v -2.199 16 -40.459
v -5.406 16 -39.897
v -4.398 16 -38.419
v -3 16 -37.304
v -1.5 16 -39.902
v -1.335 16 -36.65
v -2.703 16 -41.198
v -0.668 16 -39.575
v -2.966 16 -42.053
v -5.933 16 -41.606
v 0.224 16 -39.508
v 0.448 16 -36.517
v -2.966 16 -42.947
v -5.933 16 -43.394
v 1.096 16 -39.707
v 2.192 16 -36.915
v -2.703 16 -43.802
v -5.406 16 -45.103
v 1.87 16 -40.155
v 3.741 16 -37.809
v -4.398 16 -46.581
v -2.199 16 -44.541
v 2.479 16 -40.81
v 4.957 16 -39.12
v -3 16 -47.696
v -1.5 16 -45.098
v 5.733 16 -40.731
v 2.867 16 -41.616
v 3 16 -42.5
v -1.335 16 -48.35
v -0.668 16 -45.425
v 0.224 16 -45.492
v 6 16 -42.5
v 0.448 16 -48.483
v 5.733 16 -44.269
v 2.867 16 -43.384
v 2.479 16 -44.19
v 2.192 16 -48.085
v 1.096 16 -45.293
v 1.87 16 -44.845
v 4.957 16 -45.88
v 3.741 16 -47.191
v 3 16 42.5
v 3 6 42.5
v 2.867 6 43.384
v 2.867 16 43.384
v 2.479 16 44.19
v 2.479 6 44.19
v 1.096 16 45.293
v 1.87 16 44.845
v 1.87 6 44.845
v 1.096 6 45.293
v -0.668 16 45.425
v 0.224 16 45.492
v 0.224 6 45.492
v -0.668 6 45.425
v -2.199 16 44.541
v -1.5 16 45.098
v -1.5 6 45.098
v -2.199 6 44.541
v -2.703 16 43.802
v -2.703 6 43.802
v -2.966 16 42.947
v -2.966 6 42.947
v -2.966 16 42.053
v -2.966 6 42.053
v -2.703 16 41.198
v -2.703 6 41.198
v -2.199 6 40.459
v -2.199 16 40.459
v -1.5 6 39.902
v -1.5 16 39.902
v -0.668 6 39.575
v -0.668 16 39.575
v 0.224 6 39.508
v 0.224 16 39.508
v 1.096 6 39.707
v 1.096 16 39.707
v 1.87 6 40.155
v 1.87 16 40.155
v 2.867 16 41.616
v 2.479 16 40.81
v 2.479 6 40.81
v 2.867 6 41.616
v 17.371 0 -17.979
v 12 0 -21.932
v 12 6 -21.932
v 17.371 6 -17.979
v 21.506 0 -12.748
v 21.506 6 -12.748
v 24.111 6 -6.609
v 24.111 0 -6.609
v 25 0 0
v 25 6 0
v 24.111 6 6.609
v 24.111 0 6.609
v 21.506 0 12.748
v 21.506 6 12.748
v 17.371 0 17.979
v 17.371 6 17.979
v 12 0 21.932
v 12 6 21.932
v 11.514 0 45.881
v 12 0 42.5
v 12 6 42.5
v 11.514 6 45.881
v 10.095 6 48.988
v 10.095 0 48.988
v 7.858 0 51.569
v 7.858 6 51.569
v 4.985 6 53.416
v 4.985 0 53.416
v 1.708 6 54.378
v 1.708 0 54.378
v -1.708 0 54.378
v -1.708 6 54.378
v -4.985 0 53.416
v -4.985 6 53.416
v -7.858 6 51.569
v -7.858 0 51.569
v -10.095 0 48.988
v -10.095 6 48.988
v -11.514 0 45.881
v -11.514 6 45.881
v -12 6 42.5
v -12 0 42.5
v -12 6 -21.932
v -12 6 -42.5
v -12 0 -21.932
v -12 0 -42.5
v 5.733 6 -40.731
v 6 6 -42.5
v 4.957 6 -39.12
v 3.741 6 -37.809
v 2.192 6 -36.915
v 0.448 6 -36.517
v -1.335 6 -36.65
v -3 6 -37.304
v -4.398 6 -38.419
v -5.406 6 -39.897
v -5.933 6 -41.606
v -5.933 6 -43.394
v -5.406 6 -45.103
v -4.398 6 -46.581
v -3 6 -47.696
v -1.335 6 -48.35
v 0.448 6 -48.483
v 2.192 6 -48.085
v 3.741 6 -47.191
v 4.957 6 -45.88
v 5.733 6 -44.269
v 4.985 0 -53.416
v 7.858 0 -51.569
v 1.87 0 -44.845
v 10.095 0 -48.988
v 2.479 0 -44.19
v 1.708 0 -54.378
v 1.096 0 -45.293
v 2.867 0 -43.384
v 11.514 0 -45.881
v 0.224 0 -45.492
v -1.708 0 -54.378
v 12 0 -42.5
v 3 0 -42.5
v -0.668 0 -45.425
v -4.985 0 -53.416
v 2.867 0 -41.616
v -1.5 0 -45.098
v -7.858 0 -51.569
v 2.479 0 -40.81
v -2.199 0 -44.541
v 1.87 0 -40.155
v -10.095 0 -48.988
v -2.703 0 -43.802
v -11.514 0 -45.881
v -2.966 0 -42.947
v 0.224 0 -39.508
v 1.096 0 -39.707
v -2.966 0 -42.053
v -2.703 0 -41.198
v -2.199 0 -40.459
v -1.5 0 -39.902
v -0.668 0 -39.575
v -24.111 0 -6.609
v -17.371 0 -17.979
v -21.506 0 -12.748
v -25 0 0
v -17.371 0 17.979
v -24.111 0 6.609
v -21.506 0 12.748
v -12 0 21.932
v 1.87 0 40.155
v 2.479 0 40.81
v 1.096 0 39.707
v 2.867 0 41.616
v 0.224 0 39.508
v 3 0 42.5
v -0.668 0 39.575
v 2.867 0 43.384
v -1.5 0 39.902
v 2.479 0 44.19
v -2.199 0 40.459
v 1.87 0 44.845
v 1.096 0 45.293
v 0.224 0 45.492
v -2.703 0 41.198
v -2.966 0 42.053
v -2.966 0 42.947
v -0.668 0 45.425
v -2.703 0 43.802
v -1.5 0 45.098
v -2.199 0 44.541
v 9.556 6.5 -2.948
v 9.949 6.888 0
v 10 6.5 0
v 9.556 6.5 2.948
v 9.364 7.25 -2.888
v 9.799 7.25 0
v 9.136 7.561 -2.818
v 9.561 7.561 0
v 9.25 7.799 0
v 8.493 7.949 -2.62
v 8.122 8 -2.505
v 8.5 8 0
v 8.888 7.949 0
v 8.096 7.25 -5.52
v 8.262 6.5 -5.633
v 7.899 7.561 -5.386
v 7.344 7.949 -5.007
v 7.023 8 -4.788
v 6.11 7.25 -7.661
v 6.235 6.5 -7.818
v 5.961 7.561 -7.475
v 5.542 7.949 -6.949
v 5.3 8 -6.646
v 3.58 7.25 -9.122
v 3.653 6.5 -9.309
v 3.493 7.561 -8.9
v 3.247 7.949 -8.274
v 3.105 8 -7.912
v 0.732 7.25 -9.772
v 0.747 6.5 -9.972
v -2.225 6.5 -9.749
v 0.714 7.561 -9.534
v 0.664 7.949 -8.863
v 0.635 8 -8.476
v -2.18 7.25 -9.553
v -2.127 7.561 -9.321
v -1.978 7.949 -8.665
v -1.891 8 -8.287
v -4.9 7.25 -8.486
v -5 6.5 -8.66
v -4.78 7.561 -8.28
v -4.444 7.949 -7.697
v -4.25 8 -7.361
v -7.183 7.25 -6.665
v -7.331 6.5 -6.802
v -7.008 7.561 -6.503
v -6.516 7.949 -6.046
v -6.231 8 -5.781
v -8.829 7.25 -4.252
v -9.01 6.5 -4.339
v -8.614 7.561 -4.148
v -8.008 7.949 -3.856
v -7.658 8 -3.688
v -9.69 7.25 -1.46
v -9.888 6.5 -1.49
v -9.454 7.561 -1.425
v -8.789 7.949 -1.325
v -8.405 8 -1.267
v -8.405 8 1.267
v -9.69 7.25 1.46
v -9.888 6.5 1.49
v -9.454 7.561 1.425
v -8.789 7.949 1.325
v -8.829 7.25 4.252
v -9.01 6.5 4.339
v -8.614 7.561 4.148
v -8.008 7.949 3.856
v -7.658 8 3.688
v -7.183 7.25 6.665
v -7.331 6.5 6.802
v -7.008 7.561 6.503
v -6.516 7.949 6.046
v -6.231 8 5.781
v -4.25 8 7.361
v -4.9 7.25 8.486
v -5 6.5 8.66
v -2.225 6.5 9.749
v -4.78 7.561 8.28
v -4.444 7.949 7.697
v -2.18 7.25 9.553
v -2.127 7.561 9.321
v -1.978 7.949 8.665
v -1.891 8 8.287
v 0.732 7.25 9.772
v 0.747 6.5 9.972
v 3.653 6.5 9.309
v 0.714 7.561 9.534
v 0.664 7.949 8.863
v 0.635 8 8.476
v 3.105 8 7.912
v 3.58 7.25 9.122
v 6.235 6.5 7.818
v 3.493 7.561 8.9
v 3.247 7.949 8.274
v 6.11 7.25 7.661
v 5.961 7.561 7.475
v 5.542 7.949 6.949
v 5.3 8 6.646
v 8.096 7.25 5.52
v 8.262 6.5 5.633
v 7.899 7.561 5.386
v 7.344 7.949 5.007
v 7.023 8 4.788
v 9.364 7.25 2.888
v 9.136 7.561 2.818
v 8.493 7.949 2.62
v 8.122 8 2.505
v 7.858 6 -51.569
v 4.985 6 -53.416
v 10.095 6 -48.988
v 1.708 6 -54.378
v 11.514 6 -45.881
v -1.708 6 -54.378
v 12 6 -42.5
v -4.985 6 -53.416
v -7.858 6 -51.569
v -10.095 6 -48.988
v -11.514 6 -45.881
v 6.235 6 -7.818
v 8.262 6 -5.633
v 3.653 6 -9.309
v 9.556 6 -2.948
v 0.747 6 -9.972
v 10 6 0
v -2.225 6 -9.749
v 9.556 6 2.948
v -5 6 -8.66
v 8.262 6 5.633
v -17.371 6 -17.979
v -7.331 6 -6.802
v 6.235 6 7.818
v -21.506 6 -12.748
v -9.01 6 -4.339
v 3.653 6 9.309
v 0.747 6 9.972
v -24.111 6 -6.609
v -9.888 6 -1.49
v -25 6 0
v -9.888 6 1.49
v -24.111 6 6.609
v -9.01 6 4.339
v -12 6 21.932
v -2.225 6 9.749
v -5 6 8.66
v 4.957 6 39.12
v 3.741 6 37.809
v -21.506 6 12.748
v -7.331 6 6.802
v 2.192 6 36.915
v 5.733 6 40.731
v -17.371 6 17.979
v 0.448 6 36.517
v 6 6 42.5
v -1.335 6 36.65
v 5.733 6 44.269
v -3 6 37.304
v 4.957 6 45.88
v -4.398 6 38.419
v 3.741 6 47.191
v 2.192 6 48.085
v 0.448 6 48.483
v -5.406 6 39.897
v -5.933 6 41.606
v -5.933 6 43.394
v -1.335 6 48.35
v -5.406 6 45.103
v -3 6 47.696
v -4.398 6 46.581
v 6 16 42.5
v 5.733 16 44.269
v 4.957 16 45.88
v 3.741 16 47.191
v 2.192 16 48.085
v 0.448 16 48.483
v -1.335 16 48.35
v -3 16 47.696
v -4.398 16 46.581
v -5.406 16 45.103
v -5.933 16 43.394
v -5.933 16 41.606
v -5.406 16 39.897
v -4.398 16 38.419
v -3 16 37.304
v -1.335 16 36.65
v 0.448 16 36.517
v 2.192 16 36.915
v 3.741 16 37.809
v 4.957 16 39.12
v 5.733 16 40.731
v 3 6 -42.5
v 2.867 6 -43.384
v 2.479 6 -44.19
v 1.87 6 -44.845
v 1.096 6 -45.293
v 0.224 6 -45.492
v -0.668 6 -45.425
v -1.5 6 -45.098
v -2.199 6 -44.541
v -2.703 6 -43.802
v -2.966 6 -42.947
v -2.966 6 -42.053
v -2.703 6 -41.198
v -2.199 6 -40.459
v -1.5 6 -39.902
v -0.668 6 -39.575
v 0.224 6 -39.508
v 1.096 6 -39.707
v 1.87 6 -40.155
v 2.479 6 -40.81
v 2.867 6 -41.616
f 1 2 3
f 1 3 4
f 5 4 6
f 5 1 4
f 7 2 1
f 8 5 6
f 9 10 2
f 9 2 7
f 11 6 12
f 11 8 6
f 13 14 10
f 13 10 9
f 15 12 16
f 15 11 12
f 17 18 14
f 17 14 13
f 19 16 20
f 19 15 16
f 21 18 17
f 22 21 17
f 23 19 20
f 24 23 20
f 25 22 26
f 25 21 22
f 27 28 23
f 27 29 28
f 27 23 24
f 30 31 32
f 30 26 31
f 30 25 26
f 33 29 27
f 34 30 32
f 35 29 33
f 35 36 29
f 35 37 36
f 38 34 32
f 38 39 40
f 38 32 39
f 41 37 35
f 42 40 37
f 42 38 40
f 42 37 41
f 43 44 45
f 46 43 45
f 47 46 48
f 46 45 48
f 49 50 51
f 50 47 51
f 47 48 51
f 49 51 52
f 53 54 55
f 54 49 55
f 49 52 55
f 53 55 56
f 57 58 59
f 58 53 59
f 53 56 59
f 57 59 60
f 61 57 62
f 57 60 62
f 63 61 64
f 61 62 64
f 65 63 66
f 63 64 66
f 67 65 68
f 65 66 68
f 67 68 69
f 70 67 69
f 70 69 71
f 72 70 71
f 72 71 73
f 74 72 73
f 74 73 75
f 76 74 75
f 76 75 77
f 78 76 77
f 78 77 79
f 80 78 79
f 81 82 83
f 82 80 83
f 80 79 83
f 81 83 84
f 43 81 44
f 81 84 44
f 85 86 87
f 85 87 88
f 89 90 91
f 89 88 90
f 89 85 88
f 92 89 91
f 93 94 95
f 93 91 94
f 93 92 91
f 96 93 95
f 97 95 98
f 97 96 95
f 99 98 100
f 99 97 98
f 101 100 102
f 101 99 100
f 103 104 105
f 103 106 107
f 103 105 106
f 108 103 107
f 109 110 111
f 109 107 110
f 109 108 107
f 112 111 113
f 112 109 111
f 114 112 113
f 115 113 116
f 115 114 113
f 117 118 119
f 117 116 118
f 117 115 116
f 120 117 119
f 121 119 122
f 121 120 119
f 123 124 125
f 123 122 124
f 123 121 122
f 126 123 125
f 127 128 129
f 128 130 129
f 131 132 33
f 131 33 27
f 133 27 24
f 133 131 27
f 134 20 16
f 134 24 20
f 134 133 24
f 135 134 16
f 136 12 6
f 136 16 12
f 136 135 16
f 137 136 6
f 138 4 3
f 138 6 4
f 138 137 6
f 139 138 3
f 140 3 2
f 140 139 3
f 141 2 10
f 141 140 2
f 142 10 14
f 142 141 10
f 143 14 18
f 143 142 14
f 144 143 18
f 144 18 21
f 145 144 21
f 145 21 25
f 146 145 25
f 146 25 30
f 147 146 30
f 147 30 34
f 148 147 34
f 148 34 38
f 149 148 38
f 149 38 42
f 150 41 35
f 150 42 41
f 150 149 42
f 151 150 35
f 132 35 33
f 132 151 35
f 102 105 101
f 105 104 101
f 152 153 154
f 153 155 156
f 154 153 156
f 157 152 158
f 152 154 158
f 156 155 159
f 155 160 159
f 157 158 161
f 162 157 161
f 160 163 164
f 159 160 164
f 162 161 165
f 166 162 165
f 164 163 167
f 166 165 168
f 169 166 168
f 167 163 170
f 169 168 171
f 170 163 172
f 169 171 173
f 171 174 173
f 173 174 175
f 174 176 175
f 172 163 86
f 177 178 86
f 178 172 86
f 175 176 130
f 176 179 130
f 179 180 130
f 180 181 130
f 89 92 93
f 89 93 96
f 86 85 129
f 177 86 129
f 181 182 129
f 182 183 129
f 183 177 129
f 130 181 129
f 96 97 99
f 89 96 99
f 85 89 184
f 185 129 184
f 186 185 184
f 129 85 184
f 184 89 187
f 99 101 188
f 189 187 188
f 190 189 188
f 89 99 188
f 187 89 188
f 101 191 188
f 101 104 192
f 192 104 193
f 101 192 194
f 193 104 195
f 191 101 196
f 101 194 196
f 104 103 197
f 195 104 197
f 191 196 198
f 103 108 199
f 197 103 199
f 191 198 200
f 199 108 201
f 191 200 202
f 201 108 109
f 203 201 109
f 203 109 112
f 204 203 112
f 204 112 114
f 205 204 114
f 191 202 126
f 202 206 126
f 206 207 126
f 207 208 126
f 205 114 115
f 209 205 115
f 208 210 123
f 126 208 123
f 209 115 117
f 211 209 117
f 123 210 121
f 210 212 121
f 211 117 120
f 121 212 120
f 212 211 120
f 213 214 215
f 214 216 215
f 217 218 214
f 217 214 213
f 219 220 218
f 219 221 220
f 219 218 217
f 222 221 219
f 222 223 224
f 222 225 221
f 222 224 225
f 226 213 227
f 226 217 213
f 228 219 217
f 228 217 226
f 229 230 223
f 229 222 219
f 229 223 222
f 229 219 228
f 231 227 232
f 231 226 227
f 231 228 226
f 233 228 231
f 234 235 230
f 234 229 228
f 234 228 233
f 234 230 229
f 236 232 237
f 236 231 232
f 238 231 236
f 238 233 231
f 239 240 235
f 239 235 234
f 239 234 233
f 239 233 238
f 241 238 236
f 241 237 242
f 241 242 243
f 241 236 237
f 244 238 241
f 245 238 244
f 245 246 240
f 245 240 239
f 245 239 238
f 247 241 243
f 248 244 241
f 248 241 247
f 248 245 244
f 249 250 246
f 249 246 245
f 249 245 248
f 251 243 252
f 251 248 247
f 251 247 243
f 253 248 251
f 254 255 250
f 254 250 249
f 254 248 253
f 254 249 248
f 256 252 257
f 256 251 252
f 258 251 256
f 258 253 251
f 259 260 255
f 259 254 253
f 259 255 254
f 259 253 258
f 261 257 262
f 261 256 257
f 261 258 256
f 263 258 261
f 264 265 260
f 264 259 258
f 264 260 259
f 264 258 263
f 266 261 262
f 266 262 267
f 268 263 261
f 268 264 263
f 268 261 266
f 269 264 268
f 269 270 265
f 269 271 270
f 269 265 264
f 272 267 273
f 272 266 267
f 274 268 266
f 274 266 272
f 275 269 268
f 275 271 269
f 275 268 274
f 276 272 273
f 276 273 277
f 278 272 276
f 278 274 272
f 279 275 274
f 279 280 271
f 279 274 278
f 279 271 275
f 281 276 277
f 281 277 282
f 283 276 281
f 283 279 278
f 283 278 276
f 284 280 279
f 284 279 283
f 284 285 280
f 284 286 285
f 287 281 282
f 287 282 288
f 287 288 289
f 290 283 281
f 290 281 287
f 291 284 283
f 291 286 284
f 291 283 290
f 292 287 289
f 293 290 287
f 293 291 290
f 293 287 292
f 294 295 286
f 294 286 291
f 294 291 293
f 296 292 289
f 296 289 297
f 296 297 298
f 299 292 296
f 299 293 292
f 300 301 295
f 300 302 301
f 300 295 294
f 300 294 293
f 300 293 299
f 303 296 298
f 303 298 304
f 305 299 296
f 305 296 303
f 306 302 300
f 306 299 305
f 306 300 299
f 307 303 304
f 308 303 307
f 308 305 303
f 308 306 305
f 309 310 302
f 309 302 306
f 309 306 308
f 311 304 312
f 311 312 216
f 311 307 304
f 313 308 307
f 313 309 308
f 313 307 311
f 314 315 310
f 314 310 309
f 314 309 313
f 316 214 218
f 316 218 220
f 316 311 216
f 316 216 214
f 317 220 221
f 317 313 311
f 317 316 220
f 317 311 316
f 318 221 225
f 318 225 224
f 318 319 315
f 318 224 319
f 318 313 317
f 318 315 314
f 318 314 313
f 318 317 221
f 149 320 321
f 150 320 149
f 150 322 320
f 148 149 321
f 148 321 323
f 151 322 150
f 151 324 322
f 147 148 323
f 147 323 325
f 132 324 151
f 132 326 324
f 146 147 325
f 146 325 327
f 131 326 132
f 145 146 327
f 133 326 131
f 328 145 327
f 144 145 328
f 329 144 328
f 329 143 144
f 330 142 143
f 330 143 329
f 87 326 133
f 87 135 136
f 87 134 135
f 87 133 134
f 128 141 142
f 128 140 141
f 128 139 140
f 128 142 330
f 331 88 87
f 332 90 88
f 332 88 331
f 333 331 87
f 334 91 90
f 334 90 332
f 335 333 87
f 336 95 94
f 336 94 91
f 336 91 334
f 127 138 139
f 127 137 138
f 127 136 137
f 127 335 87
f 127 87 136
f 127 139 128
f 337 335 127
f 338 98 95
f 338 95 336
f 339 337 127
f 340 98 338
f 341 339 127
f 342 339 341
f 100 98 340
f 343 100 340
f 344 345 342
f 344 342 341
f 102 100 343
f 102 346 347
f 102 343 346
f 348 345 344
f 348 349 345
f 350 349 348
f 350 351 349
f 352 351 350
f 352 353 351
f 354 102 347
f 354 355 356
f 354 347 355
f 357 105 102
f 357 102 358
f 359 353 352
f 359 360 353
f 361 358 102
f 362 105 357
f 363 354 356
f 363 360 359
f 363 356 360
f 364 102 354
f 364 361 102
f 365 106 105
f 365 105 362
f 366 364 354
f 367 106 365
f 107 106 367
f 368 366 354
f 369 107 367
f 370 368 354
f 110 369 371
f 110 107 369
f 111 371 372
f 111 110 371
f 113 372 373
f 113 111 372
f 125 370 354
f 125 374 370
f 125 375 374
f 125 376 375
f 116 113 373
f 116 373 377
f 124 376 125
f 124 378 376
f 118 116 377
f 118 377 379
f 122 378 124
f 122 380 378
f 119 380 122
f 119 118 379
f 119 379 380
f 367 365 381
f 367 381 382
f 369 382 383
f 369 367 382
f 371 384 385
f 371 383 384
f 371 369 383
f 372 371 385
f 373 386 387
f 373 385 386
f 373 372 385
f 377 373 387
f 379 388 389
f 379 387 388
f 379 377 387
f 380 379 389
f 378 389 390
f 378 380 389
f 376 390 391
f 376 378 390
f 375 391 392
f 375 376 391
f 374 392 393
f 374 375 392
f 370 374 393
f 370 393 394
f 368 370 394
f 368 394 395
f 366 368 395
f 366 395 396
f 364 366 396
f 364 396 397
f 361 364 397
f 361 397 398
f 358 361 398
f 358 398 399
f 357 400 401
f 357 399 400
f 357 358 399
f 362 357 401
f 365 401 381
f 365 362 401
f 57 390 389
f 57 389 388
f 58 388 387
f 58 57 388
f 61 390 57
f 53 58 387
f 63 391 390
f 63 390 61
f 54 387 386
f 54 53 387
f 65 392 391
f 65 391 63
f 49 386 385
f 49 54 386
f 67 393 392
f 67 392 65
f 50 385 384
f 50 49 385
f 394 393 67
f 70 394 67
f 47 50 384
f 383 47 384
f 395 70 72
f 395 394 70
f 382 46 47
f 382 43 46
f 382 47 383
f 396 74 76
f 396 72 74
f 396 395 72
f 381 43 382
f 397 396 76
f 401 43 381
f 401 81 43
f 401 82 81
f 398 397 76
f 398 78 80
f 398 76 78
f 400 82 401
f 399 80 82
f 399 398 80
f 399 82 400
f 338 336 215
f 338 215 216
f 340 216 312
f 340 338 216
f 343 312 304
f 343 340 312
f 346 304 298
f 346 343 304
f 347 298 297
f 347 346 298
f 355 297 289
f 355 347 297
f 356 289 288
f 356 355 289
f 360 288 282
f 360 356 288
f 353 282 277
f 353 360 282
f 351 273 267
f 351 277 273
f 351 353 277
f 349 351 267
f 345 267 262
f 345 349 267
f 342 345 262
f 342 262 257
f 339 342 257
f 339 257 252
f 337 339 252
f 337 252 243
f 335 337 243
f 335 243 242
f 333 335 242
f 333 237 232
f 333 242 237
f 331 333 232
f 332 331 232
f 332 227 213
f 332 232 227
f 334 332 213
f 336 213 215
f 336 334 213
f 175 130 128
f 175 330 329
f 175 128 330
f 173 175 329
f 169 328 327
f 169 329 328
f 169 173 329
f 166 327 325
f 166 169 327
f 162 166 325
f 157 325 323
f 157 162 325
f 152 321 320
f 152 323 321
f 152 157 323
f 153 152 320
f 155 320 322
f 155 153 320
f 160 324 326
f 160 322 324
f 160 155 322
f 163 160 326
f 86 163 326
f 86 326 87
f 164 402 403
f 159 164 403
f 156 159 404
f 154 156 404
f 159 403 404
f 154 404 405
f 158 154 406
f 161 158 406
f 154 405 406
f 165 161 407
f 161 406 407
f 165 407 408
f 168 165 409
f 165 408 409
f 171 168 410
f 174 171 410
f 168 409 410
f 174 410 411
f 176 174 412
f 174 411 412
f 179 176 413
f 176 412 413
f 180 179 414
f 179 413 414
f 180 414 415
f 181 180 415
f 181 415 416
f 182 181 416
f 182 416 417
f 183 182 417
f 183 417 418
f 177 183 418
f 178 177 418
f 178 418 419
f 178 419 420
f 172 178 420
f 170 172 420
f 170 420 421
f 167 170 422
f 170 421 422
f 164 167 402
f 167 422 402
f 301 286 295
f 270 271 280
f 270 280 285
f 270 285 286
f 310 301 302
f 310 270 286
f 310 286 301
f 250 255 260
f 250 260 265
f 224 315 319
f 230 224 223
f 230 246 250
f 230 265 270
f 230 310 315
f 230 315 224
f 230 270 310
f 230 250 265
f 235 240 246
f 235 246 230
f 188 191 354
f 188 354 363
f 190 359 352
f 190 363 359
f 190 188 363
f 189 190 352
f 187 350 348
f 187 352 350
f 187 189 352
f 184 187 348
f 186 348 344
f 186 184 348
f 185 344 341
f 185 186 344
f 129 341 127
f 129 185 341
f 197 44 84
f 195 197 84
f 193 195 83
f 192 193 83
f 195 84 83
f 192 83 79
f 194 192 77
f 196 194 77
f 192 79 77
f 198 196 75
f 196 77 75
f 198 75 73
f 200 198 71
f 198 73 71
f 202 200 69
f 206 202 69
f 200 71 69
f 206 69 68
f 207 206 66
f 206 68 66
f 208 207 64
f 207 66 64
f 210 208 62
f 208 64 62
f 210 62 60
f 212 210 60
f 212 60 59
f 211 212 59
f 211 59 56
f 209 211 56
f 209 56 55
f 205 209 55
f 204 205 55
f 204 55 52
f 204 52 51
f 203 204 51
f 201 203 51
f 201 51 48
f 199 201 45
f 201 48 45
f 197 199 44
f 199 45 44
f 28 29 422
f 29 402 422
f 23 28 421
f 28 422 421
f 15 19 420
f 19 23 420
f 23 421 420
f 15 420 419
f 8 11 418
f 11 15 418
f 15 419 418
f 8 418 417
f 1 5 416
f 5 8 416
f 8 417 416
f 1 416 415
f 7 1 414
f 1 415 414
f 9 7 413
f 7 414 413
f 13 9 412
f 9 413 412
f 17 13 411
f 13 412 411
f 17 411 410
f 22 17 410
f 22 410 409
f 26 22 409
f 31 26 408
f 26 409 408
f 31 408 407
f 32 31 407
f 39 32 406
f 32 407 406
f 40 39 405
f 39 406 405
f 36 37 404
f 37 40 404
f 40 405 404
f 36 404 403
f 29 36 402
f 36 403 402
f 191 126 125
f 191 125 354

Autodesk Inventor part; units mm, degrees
ref_plane "YZ Plane" through (0, 0, 0) normal (1, 0, 0) x (0, 1, 0)
ref_plane "XZ Plane" through (0, 0, 0) normal (0, 1, 0) x (-1, 0, 0)
ref_plane "XY Plane" through (0, 0, 0) normal (0, 0, 1) x (1, 0, 0)
sketch "Sketch1" plane through (0, 0, 0) normal (0, 1, 0) x (-1, 0, 0)
  arc A0 (12, 42.5) -> (-12, 42.5) centre (0, 42.5) ccw
  arc A1 (-12, -42.5) -> (12, -42.5) centre (0, -42.5) ccw
  line L0 (0, 42.5) -> (12, 42.5) construction
  line L1 (0, -42.5) -> (12, -42.5) construction
  line L2 (0, -42.5) -> (-12, -42.5) construction
  line L3 (0, 42.5) -> (-12, 42.5) construction
  line L4 (12, 42.5) -> (12, 21.9317)
  line L5 (12, -42.5) -> (12, -21.9317)
  line L6 (-12, -42.5) -> (-12, -21.9317)
  line L7 (-12, 42.5) -> (-12, 21.9317)
  arc A2 (-12, 21.9317) -> (-12, -21.9317) centre (0, 0) ccw
  arc A3 (12, -21.9317) -> (12, 21.9317) centre (0, 0) ccw
extrude "Extrusion1" add sketch "Sketch1" along normal blind 6
sketch "Sketch2" plane through (0, 6, 0) normal (0, 1, 0) x (1, 0, 0)
  circle A0 centre (0, 0) radius 10
  circle A1 centre (0, 0) radius 19.5 construction
  arc A2 (-12, -42.5) -> (12, -42.5) centre (0, -42.5) ccw construction
  line L0 (0, -42.5) -> (0, -54.5) construction
  arc A3 (12, 42.5) -> (-12, 42.5) centre (0, 42.5) ccw construction
  line L1 (0, 42.5) -> (0, 54.5) construction
  circle A4 centre (0, -42.5) radius 6
  circle A5 centre (0, -42.5) radius 3
  circle A6 centre (0, 42.5) radius 6
  circle A7 centre (0, 42.5) radius 3
  dimension "d11" = 20
  dimension "d12" = 39
extrude "Extrusion2" add sketch "Sketch2" along normal blind 10 contours A4 | A6
sketch "Sketch3" plane through (0, 6, 42.5) normal (0, 1, 0) x (1, 0, 0)
  circle A0 centre (0, 0) radius 3 projected
  circle A1 centre (0, 0) radius 3
  point P0 (0, 42.5)
extrude "Extrusion3" cut sketch "Sketch3" against normal blind 7
sketch "Sketch4" plane through (0, 6, -42.5) normal (0, 1, 0) x (1, 0, 0)
  circle A0 centre (0, 0) radius 3
  point P0 (0, -42.5)
extrude "Extrusion4" cut sketch "Sketch4" against normal blind 7
sketch "Sketch5" plane through (0, 6, 0) normal (0, 1, 0) x (1, 0, 0)
  circle A0 centre (0, 0) radius 10
  dimension "d23" = 20
extrude "Extrusion5" add sketch "Sketch5" along normal blind 2
fillet "Fillet1" radius 1.5 1 edges at (-10, 8, 0)
properties part number "Coperchio Superiore"
